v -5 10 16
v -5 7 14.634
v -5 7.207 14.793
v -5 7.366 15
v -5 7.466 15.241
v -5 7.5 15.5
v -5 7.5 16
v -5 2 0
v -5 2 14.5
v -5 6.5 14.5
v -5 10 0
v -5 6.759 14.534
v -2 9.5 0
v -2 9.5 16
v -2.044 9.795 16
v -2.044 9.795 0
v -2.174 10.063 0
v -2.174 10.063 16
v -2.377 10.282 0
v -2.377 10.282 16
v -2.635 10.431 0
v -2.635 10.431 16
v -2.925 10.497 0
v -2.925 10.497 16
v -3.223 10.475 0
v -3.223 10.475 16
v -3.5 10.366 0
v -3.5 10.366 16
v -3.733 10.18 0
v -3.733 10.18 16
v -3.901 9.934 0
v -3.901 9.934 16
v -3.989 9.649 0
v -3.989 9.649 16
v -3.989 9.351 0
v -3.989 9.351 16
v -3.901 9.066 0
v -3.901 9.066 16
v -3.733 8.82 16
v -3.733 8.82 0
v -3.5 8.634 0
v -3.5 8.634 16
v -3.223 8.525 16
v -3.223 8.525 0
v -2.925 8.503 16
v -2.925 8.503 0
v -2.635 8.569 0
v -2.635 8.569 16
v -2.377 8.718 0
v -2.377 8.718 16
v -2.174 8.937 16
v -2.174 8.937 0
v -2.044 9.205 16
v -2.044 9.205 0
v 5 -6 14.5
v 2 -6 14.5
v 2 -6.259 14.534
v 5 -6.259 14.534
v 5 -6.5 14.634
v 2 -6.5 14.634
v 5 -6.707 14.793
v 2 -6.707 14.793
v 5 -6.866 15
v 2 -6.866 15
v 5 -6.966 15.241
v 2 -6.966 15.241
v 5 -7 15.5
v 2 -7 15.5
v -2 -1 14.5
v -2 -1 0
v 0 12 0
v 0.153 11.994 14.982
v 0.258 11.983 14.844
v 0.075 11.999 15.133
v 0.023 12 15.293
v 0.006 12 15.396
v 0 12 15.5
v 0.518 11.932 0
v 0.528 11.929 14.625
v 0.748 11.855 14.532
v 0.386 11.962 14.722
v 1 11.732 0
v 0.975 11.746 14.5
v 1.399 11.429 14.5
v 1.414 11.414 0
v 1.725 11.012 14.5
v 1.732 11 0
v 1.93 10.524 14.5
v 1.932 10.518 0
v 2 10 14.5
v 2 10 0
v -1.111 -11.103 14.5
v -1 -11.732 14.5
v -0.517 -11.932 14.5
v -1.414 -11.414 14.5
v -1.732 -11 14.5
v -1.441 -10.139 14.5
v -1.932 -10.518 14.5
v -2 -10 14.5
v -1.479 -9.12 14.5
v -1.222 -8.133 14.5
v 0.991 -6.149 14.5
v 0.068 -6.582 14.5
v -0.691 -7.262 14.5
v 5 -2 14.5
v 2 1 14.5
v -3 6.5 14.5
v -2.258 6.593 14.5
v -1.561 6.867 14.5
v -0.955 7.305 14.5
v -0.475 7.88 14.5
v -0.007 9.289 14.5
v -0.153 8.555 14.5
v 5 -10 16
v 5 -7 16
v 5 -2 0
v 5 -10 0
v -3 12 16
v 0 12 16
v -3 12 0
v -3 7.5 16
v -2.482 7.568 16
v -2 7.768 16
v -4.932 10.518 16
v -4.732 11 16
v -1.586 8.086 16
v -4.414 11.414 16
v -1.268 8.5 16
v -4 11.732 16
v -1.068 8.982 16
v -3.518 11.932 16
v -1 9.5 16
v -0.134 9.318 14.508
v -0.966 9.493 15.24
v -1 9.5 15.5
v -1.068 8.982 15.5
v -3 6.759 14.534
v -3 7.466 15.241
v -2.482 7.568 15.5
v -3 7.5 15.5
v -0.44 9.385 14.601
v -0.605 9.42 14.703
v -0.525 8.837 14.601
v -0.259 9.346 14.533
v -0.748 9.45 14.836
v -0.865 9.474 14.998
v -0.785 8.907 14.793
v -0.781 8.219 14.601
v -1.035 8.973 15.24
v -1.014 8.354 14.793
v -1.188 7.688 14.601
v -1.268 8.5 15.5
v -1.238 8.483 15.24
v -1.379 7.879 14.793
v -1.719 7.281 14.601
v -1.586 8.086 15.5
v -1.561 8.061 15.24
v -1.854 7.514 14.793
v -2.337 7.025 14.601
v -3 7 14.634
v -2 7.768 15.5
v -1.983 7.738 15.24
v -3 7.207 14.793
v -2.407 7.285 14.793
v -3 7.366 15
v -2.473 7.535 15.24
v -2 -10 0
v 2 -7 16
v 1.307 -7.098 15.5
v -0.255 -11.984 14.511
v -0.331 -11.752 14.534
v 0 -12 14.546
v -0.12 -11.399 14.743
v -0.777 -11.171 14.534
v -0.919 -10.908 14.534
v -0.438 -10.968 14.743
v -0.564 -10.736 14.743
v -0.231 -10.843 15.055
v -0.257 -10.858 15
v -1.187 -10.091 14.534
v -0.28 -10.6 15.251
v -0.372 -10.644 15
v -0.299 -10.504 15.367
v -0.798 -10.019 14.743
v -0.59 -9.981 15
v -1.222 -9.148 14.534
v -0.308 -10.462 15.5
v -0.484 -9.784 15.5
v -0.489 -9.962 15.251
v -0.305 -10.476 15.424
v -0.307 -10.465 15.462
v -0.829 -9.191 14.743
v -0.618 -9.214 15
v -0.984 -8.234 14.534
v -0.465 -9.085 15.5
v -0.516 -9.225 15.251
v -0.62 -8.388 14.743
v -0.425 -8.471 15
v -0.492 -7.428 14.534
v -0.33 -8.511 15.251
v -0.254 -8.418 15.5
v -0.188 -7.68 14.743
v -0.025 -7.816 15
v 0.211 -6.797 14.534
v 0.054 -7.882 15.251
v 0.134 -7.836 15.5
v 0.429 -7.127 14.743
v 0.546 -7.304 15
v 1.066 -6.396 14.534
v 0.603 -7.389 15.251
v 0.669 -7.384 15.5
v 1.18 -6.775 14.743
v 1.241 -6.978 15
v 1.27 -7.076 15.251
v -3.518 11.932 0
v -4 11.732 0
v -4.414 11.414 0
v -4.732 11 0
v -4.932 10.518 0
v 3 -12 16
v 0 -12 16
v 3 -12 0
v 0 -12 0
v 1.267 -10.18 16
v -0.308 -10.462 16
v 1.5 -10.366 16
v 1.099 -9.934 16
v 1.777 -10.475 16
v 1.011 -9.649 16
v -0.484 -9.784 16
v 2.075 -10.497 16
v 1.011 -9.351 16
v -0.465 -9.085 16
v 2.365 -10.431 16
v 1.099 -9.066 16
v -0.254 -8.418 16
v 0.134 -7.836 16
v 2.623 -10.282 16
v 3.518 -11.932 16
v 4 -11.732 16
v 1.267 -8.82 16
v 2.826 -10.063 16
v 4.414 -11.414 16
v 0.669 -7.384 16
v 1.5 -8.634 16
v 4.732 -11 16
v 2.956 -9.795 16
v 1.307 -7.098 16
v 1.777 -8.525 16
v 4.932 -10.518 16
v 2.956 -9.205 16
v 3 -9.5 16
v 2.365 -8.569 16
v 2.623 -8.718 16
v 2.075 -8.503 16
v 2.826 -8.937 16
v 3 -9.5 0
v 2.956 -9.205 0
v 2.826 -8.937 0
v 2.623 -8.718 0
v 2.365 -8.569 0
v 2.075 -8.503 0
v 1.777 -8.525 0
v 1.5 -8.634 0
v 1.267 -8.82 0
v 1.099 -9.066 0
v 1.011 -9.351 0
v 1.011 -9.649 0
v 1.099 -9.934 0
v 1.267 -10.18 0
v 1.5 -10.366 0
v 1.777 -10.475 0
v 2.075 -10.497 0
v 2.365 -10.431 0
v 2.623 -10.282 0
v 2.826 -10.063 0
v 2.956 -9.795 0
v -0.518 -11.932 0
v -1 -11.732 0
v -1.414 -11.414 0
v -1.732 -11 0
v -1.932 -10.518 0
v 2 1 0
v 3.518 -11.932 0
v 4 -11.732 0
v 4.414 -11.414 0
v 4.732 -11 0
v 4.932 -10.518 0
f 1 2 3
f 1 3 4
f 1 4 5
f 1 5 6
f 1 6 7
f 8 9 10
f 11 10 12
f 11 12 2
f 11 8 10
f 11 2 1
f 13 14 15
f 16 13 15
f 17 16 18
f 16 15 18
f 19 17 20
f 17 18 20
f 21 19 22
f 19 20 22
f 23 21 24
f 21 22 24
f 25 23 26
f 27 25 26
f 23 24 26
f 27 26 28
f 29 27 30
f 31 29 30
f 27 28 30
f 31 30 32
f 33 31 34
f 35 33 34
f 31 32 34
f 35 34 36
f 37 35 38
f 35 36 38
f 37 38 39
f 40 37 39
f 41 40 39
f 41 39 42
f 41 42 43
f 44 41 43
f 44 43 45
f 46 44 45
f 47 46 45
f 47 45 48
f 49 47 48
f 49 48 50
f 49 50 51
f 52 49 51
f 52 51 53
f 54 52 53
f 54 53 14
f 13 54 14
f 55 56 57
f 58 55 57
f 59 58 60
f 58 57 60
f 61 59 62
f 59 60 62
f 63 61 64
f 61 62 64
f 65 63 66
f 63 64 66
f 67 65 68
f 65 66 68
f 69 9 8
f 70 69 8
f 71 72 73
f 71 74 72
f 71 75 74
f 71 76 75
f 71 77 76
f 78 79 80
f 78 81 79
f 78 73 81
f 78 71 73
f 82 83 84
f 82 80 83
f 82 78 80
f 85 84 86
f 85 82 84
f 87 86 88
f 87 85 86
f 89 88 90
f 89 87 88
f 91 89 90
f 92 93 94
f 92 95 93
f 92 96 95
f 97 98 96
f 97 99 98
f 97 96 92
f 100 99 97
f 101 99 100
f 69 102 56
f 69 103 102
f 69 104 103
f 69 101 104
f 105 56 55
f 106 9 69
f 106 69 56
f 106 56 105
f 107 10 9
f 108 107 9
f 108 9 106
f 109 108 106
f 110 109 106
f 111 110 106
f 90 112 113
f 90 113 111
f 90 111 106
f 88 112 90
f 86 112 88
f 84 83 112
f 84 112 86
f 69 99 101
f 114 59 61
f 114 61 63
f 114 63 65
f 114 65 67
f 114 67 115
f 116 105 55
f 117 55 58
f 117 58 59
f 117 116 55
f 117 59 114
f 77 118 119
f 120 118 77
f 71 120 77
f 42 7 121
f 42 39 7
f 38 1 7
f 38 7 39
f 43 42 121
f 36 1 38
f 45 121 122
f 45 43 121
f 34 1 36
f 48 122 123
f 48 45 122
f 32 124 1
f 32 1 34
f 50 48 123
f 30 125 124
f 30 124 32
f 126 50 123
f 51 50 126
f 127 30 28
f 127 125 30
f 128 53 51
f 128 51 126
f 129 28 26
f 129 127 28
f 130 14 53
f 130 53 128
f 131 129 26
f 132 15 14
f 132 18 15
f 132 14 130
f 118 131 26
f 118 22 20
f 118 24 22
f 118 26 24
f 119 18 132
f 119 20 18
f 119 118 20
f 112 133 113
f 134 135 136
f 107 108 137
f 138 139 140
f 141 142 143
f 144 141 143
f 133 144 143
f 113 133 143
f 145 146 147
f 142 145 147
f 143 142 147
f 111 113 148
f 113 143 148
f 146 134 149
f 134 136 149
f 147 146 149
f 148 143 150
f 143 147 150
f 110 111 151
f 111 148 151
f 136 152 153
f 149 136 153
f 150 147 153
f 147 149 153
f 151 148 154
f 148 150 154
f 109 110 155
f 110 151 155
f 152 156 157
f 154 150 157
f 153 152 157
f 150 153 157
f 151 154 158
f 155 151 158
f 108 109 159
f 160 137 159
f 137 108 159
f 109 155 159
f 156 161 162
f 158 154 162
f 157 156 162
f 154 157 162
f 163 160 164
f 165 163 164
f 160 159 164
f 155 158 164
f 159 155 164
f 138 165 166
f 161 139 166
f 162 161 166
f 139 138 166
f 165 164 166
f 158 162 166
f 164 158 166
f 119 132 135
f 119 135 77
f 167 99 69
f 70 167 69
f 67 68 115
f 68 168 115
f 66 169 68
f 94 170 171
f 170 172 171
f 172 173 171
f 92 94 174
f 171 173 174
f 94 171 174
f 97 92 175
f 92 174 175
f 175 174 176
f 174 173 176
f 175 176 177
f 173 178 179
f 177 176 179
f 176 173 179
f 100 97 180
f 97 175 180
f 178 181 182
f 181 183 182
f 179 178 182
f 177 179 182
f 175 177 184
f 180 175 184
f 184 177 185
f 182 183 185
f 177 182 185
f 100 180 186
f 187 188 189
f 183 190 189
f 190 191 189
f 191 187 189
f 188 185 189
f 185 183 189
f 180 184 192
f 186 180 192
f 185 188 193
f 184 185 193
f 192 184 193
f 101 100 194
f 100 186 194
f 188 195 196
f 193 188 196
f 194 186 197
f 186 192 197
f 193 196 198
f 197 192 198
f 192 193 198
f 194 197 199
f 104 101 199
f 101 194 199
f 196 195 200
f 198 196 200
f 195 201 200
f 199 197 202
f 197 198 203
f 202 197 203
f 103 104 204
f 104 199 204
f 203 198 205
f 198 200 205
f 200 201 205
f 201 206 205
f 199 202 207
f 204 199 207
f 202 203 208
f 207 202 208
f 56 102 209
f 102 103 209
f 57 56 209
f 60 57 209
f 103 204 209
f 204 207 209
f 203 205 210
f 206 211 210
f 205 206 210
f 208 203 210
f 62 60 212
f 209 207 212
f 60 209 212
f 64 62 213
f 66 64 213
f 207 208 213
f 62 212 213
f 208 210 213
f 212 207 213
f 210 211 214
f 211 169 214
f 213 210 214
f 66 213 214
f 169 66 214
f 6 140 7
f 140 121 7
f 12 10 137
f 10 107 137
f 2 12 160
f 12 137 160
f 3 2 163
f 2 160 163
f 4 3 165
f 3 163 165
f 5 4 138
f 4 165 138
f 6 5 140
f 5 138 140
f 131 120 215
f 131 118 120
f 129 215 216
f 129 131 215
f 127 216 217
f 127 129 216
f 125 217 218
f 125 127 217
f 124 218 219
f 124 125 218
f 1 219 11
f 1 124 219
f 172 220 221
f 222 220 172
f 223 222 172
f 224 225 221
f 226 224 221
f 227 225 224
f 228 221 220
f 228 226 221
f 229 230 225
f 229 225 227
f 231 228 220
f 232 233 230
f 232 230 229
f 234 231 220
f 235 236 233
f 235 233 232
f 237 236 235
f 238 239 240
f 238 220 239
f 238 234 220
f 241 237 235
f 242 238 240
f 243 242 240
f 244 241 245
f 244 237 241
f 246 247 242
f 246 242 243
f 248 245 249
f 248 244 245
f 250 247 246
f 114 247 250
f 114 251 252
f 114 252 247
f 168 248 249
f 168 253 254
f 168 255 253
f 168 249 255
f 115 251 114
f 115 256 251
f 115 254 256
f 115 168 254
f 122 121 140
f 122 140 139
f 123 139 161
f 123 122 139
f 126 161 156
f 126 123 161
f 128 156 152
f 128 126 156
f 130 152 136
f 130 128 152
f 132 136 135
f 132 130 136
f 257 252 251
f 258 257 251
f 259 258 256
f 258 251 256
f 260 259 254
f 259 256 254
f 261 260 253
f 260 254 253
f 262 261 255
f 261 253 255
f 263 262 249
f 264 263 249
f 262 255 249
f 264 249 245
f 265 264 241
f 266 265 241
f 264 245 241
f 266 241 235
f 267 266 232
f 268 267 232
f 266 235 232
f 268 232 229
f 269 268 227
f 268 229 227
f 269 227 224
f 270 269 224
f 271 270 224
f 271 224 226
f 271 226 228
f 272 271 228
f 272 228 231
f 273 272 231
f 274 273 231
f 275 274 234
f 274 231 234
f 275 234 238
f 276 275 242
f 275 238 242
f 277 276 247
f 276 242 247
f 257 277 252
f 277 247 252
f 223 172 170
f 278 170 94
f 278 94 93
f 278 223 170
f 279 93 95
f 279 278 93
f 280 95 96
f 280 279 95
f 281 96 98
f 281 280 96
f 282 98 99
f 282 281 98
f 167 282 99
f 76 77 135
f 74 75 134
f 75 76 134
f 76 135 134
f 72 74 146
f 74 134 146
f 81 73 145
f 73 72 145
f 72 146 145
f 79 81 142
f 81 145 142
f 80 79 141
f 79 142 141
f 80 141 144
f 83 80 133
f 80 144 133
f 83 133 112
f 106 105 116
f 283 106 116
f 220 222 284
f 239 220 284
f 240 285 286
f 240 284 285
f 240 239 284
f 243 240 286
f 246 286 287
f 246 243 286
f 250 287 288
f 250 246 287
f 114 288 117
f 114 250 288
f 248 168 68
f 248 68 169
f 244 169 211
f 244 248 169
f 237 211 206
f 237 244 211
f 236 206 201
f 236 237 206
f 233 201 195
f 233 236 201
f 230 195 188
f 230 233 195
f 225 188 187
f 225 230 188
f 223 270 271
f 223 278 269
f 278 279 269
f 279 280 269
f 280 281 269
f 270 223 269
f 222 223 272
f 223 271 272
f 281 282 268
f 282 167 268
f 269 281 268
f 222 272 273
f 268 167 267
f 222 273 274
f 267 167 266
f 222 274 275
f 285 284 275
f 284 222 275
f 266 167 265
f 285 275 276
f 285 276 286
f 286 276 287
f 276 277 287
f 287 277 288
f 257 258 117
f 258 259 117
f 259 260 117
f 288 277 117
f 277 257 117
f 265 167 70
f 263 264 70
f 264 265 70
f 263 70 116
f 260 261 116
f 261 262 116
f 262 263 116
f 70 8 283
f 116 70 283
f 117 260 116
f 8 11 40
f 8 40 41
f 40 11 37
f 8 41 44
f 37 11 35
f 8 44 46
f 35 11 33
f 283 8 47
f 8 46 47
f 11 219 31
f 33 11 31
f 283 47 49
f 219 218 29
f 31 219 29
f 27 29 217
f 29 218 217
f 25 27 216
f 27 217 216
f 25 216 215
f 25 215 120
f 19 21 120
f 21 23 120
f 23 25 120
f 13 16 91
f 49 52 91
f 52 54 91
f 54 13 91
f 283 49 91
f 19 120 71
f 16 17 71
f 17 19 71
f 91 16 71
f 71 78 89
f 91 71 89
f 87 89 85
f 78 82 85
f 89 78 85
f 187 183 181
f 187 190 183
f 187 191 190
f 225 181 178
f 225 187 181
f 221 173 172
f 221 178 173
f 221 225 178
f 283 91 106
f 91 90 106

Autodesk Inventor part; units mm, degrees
ref_plane "YZ Plane" through (0, 0, 0) normal (1, 0, 0) x (0, 1, 0)
ref_plane "XZ Plane" through (0, 0, 0) normal (0, 1, 0) x (-1, 0, 0)
ref_plane "XY Plane" through (0, 0, 0) normal (0, 0, 1) x (1, 0, 0)
sketch "Sketch1" plane through (0, 0, 0) normal (0, 0, 1) x (1, 0, 0)
  line L0 (-5, 12) -> (5, 12)
  line L1 (5, 12) -> (5, -12)
  line L2 (5, -12) -> (-5, -12)
  line L3 (-5, -12) -> (-5, 12)
  point P0 (0, 0)
  dimension "d0" = 10
  dimension "d1" = 24
  dimension "d2" = 12
  dimension "d3" = 5
extrude "Extrusion1" add sketch "Sketch1" along normal blind 16
sketch "Sketch2" plane through (0, 0, 16) normal (0, 0, 1) x (1, 0, 0)
  line L0 (-5, -12) -> (5, -12) projected
  line L1 (5, -12) -> (5, 12) projected
  circle A0 centre (2, -9.5) radius 1
  point P0 (0, 0)
  point P1 (-2.9408, 9.031)
  dimension "d6" = 2.5
  dimension "d7" = 3
  dimension "d8" = 2
extrude "Extrusion2" cut sketch "Sketch2" against normal blind 16
sketch "Sketch3" plane through (0, 0, 16) normal (0, 0, 1) x (1, 0, 0)
  circle A0 centre (2, -9.5) radius 1 projected
  circle A1 centre (-3, 9.5) radius 1
  point P0 (0, 0)
  point P1 (23.854, -2.3999)
  dimension "d11" = 5
  dimension "d12" = 19
  dimension "d13" = 2
extrude "Extrusion3" cut sketch "Sketch3" against normal blind 16 contours A1
sketch "Sketch4" plane through (0, 0, 16) normal (0, 0, 1) x (1, 0, 0)
  line L0 (-5, 12) -> (-5, -12) projected
  line L1 (-5, -12) -> (-2, -12)
  line L2 (-2, -12) -> (-2, 2)
  line L3 (-2, 2) -> (-5, 2)
  line L4 (-5, 2) -> (-5, -12)
  line L5 (5, -12) -> (5, 12) projected
  line L6 (5, 12) -> (2, 12)
  line L7 (2, 12) -> (2, -2)
  line L8 (2, -2) -> (5, -2)
  line L9 (5, -2) -> (5, 12)
  point P0 (0, 0)
  dimension "d16" = 3
  dimension "d17" = 3
  dimension "d18" = 14
  dimension "d19" = 14
extrude "Extrusion4" cut sketch "Sketch4" against normal blind 16
chamfer "Chamfer1" distance 3 angle 45 2 edges at (-2, 2, 8) (2, -2, 8)
fillet "Fillet1" radius 2 4 edges at (-5, 12, 8) (2, 12, 8) (5, -12, 8) (-2, -12, 8)
sketch "Sketch5" plane through (0, 0, 16) normal (0, 0, 1) x (1, 0, 0)
  circle A0 centre (-3, 9.5) radius 1 projected
  circle A1 centre (-3, 9.5) radius 2
  line L0 (-5, 10) -> (-5, 2) projected
  circle A2 centre (2, -9.5) radius 1 projected
  circle A3 centre (2, -9.5) radius 2.5
  line L1 (0, -12) -> (3, -12) projected
  line L2 (-5, 12) -> (5, 12)
  line L3 (5, 12) -> (5, -12)
  line L4 (5, -12) -> (-5, -12)
  line L5 (-5, -12) -> (-5, 12)
  line L6 (0, 12) -> (-3, 12) projected
  line L7 (5, -10) -> (5, -2) projected
  line L8 (-2, -1) -> (-2, -10) projected
  line L9 (2, -7) -> (5, -7)
  line L10 (-3, 7.5) -> (-5, 7.5)
  arc A4 (2, 10) -> (0, 12) centre (0, 10) ccw projected
  line L11 (-1, 9.5) -> (0, 12)
  line L12 (0, 12) -> (-5, 12)
  line L13 (-0.5, -9.5) -> (0, -12)
  point P0 (0, 0)
  point P1 (-0.3077, -10.4615)
extrude "Extrusion5" cut sketch "Sketch5" against normal blind 1.5 contours A1 L11 L2 L3 L9 A3 L13 L4 L5 L0 L10
fillet "Fillet2" radius 1 5 edges at (-0.5, 10.75, 14.5) (-4, 7.5, 14.5) (-1.5858, 8.0858, 14.5) (-0.0801, -8.1132, 14.5) (3.5, -7, 14.5)
properties part number "bridge_structure_C"
